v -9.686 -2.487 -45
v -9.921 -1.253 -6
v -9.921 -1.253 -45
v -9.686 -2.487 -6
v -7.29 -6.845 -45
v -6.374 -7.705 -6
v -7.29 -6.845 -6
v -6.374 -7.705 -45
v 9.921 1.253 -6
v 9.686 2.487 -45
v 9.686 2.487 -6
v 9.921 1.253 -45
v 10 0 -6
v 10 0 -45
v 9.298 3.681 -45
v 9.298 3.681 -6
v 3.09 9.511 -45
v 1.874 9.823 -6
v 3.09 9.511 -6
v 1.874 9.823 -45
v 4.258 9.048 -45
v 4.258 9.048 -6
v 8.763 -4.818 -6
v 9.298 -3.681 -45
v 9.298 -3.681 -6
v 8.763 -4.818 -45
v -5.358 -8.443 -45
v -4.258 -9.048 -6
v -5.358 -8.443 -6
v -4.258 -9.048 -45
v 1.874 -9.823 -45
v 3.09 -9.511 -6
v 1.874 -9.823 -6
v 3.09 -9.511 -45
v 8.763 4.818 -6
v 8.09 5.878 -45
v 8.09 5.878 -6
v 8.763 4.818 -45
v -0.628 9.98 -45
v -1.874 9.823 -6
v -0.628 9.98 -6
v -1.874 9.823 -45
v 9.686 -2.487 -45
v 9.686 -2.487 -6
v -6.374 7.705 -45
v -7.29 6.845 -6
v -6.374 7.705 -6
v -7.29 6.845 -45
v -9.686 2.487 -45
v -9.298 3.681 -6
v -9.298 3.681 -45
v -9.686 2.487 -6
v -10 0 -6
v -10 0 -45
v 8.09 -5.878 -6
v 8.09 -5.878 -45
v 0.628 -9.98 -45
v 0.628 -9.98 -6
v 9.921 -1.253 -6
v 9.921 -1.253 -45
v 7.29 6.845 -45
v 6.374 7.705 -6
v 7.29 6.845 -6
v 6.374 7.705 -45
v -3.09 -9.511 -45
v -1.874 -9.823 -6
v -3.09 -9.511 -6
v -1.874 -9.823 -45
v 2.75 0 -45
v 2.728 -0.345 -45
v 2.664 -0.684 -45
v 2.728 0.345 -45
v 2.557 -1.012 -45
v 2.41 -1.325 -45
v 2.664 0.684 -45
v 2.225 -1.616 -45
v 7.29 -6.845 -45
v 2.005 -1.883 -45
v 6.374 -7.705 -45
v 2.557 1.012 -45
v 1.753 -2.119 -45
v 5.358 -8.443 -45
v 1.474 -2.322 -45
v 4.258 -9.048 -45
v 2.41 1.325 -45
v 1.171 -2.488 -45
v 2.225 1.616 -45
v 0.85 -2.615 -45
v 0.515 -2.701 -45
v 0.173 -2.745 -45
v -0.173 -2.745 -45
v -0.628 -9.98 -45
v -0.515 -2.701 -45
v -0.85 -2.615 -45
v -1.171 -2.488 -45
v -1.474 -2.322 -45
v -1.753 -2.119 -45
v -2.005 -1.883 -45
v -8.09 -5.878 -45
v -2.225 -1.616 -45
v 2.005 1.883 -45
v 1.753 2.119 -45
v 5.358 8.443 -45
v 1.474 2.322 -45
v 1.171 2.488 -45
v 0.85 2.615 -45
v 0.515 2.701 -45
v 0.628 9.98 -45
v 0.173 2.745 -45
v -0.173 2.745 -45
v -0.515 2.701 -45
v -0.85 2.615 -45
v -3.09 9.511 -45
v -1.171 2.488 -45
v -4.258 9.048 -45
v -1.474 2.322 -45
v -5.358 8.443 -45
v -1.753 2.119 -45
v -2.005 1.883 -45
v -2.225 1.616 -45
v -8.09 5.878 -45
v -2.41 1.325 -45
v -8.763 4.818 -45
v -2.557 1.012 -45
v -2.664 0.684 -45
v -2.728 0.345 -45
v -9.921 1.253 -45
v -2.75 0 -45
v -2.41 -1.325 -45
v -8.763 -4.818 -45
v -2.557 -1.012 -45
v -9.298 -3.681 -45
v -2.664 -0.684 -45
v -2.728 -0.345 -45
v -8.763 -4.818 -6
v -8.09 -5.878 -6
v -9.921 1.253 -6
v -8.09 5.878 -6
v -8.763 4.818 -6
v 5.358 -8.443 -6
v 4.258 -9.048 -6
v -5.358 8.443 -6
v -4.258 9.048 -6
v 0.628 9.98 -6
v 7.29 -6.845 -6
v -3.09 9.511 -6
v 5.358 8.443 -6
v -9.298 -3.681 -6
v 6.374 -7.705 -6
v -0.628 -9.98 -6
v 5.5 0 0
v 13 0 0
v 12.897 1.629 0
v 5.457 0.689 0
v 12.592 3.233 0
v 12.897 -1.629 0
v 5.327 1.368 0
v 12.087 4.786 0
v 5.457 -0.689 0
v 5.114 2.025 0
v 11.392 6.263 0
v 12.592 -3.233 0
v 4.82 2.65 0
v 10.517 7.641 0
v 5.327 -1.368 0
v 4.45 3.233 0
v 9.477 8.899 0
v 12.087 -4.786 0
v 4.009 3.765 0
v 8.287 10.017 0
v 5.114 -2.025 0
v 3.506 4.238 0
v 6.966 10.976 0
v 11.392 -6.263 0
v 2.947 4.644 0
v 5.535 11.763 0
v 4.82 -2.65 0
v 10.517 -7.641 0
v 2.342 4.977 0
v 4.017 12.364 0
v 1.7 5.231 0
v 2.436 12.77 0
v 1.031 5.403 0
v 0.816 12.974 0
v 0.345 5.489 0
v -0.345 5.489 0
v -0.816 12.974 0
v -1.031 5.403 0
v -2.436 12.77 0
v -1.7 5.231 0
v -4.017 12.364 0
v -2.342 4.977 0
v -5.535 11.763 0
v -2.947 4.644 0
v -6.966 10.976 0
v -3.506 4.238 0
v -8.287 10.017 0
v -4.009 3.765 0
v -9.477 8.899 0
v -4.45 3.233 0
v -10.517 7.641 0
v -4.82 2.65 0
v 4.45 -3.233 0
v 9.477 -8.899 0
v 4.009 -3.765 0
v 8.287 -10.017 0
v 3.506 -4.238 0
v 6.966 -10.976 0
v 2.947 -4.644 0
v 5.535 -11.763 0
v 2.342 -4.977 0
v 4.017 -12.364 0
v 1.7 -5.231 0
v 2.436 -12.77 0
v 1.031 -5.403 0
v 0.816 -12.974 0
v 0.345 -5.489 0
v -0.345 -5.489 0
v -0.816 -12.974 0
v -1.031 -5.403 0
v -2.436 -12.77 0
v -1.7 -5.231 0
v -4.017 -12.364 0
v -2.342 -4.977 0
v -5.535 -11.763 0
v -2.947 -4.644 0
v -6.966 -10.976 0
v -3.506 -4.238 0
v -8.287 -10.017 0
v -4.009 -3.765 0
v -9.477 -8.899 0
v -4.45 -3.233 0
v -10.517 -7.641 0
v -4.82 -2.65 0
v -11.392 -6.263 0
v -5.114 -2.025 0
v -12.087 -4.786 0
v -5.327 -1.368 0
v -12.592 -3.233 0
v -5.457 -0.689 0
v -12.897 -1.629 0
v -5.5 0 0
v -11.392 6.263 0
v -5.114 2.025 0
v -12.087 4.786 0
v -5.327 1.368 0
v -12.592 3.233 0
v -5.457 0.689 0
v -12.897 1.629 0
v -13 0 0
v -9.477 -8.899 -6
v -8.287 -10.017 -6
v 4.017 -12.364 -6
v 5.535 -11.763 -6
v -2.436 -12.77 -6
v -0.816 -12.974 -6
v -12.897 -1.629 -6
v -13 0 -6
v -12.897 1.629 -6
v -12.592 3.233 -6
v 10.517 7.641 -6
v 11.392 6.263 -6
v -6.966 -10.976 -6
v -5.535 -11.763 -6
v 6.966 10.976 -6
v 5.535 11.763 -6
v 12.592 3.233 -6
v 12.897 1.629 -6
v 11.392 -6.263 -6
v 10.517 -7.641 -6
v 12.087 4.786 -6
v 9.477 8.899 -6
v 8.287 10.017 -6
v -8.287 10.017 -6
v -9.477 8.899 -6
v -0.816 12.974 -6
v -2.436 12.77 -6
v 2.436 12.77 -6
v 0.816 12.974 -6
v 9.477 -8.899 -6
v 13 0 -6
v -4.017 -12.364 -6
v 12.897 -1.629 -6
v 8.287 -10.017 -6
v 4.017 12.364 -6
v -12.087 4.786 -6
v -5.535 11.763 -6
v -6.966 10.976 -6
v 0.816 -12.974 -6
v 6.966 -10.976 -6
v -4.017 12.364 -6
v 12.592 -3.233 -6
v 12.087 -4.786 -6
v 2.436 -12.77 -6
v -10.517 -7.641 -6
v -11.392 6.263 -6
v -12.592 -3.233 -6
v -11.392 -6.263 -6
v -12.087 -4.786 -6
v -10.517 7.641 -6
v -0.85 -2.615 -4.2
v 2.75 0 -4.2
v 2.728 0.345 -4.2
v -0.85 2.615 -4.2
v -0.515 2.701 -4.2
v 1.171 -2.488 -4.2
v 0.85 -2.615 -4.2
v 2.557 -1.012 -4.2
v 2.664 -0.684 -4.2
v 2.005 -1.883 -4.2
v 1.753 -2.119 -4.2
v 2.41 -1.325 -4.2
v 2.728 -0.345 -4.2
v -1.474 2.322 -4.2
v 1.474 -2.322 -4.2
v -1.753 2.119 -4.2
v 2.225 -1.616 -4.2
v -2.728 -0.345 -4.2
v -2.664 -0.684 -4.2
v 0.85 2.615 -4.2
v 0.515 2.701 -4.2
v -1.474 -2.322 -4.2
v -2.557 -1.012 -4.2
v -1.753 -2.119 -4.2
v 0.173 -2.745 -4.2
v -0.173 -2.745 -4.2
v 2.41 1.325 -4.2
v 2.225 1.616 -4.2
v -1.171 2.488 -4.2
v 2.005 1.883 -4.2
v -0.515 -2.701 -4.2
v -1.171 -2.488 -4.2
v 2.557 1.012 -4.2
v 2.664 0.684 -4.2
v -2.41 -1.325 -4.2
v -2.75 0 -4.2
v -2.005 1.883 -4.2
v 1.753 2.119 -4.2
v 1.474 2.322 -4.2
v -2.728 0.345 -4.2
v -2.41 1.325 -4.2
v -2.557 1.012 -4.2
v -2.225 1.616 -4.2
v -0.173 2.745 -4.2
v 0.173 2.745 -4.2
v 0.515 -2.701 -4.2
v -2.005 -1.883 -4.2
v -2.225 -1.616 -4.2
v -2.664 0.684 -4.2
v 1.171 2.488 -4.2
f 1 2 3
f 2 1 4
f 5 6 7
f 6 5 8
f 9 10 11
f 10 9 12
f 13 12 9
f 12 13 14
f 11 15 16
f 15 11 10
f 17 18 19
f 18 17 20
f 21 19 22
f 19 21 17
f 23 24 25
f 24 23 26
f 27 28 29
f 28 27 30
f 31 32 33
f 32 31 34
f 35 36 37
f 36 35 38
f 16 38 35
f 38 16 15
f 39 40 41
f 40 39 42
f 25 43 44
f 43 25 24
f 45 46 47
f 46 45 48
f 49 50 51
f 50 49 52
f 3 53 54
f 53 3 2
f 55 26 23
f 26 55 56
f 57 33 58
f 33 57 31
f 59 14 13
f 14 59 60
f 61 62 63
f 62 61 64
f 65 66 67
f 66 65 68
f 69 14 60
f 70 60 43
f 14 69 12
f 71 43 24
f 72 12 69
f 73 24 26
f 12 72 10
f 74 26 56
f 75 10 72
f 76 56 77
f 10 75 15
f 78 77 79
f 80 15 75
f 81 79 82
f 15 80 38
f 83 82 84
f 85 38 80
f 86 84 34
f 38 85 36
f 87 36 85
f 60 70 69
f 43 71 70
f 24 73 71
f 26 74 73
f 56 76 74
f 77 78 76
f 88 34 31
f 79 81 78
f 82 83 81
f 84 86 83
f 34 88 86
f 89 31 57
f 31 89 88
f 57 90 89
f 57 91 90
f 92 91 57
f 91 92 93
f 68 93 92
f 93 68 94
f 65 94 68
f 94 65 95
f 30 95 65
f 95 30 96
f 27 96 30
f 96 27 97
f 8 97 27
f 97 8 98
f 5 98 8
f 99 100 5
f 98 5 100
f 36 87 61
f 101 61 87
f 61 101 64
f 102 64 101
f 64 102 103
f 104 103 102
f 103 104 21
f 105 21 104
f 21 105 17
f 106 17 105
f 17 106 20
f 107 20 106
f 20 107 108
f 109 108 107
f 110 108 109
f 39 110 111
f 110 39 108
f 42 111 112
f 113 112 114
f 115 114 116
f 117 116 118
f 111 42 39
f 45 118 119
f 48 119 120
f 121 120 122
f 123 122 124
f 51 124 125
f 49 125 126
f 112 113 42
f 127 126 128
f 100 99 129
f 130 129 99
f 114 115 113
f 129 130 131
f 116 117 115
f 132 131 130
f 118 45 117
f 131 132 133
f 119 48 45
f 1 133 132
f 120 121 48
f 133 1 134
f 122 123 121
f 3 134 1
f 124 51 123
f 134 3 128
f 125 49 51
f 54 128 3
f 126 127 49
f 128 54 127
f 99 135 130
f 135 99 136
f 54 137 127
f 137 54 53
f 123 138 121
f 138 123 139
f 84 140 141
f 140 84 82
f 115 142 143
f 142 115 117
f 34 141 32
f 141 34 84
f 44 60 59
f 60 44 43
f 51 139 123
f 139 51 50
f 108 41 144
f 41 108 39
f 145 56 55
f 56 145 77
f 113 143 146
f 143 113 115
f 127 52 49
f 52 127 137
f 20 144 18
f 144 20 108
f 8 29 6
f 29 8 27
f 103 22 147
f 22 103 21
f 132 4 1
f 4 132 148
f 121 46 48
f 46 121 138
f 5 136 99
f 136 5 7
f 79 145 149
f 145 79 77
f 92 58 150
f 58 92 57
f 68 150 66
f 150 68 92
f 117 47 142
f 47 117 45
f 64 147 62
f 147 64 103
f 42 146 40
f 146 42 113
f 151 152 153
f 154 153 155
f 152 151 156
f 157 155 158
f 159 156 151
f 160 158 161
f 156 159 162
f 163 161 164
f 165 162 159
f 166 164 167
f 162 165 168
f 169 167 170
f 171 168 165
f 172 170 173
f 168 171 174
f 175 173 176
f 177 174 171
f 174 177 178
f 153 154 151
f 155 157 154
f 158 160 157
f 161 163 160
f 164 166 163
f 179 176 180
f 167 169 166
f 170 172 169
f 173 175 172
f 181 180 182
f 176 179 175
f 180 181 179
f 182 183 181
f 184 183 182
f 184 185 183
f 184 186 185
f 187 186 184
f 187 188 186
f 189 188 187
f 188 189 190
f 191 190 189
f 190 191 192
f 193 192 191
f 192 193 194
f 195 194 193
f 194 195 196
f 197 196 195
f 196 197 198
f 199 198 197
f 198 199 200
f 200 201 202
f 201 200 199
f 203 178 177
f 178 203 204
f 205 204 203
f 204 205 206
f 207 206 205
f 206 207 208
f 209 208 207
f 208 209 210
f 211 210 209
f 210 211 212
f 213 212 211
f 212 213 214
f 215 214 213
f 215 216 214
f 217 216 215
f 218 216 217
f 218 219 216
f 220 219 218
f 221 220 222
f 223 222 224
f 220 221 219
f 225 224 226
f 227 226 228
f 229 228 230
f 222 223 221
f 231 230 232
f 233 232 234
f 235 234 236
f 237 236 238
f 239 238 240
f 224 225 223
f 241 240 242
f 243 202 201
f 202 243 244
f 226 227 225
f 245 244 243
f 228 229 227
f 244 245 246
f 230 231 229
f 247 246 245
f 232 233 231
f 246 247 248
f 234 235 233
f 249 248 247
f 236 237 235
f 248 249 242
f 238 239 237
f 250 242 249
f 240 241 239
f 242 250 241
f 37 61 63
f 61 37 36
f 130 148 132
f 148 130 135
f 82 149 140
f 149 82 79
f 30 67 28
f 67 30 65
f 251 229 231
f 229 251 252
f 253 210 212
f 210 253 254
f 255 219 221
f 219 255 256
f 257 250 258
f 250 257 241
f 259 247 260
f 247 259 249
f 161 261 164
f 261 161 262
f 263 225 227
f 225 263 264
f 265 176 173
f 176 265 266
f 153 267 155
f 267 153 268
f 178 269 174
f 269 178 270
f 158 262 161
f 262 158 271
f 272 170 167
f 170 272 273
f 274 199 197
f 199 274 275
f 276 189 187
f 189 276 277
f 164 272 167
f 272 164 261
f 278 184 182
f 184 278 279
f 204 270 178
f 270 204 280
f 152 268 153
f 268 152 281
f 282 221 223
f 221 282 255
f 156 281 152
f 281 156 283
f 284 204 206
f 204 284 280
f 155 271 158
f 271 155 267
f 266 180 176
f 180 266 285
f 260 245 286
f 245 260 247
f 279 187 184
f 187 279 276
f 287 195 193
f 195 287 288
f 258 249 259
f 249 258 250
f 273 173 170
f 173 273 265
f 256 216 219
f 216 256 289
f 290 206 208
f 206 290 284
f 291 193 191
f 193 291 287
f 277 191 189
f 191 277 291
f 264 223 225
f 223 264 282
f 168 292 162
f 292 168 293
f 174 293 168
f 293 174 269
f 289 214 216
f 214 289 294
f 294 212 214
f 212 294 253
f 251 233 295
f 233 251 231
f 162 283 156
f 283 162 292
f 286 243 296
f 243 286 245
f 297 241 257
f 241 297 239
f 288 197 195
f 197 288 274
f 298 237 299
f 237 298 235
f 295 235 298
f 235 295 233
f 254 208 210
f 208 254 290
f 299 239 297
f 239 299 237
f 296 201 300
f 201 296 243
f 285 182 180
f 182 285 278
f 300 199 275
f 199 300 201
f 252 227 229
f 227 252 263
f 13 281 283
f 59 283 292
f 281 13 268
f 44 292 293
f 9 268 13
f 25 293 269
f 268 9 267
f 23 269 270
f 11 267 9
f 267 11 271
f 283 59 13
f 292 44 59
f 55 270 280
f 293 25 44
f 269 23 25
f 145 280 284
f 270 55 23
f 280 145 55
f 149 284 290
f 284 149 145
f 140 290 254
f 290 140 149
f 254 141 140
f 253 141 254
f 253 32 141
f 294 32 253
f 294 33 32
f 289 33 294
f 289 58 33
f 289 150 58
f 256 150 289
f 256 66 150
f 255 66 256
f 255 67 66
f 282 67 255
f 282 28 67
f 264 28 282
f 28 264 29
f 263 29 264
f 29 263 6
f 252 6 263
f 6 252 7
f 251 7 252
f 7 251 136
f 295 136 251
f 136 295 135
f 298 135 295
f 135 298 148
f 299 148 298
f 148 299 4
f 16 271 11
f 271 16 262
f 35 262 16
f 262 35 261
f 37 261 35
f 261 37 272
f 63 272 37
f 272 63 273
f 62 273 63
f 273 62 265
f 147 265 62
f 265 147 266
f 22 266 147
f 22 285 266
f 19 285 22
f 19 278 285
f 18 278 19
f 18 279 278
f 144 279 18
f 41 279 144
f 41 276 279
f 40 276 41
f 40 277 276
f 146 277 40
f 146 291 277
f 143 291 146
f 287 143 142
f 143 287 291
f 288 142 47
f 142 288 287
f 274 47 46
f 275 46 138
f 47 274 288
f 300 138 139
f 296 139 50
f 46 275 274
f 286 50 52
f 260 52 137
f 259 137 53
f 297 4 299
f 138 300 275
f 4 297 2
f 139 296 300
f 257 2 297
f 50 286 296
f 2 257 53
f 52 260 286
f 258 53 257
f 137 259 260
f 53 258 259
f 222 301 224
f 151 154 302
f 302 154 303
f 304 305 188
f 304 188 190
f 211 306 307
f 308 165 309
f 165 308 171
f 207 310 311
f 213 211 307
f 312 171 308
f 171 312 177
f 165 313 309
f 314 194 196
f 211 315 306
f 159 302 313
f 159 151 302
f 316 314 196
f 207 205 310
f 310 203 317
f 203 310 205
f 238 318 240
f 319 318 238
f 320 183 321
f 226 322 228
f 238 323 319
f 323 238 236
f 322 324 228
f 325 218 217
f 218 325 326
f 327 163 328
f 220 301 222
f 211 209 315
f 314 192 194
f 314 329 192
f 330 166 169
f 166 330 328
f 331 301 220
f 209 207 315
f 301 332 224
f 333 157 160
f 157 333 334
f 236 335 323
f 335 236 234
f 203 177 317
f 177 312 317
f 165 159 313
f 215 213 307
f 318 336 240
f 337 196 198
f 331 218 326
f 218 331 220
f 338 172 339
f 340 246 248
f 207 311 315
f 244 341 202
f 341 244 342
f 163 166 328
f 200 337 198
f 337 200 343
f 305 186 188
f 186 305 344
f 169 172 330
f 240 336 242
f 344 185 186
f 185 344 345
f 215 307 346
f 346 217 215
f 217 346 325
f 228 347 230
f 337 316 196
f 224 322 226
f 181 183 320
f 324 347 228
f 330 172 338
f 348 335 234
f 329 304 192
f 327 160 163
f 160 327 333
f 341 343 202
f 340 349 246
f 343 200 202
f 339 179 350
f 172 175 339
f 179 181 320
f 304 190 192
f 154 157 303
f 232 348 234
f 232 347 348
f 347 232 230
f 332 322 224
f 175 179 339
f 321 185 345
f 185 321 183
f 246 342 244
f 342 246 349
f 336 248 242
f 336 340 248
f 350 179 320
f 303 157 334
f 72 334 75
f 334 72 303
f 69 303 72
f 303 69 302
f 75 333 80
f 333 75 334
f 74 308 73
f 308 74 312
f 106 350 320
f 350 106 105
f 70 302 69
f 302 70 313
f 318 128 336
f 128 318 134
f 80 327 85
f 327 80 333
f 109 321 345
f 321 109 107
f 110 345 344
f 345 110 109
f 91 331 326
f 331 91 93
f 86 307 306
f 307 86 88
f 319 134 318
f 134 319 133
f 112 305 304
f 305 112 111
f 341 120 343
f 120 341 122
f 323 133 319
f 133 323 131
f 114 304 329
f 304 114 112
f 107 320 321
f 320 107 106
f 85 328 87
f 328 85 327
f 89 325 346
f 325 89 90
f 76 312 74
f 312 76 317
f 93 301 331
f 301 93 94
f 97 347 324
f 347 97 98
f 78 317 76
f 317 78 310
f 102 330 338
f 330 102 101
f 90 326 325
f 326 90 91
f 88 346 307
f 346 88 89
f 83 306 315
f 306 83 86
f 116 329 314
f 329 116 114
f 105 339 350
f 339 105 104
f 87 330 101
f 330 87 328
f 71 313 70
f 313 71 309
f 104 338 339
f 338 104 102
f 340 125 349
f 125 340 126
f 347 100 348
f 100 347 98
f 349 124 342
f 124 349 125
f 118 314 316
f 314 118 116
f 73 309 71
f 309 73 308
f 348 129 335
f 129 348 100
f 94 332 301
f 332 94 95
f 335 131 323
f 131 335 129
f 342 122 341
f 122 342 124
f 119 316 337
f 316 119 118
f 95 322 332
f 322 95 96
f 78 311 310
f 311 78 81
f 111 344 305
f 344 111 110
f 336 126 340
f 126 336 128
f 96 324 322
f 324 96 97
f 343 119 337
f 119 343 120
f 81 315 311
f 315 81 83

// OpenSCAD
$fn = 50;


difference() {
	union() {
		translate(v = [0, 0, -45.0000000000]) {
			cylinder(h = 45, r = 10.0000000000);
		}
		translate(v = [0, 0, -6.0000000000]) {
			cylinder(h = 6, r = 13.0000000000);
		}
	}
	union() {
		translate(v = [0, 0, 0]) {
			rotate(a = [0, 0, 0]) {
				difference() {
					union() {
						#translate(v = [0, 0, -45.0000000000]) {
							cylinder(h = 45, r = 2.2500000000);
						}
						#translate(v = [0, 0, -4.2000000000]) {
							cylinder(h = 4.2000000000, r1 = 2.7500000000, r2 = 5.5000000000);
						}
						#translate(v = [0, 0, -45.0000000000]) {
							cylinder(h = 45, r = 2.7500000000);
						}
						#translate(v = [0, 0, -45.0000000000]) {
							cylinder(h = 45, r = 2.2500000000);
						}
					}
					union();
				}
			}
		}
	}
}
